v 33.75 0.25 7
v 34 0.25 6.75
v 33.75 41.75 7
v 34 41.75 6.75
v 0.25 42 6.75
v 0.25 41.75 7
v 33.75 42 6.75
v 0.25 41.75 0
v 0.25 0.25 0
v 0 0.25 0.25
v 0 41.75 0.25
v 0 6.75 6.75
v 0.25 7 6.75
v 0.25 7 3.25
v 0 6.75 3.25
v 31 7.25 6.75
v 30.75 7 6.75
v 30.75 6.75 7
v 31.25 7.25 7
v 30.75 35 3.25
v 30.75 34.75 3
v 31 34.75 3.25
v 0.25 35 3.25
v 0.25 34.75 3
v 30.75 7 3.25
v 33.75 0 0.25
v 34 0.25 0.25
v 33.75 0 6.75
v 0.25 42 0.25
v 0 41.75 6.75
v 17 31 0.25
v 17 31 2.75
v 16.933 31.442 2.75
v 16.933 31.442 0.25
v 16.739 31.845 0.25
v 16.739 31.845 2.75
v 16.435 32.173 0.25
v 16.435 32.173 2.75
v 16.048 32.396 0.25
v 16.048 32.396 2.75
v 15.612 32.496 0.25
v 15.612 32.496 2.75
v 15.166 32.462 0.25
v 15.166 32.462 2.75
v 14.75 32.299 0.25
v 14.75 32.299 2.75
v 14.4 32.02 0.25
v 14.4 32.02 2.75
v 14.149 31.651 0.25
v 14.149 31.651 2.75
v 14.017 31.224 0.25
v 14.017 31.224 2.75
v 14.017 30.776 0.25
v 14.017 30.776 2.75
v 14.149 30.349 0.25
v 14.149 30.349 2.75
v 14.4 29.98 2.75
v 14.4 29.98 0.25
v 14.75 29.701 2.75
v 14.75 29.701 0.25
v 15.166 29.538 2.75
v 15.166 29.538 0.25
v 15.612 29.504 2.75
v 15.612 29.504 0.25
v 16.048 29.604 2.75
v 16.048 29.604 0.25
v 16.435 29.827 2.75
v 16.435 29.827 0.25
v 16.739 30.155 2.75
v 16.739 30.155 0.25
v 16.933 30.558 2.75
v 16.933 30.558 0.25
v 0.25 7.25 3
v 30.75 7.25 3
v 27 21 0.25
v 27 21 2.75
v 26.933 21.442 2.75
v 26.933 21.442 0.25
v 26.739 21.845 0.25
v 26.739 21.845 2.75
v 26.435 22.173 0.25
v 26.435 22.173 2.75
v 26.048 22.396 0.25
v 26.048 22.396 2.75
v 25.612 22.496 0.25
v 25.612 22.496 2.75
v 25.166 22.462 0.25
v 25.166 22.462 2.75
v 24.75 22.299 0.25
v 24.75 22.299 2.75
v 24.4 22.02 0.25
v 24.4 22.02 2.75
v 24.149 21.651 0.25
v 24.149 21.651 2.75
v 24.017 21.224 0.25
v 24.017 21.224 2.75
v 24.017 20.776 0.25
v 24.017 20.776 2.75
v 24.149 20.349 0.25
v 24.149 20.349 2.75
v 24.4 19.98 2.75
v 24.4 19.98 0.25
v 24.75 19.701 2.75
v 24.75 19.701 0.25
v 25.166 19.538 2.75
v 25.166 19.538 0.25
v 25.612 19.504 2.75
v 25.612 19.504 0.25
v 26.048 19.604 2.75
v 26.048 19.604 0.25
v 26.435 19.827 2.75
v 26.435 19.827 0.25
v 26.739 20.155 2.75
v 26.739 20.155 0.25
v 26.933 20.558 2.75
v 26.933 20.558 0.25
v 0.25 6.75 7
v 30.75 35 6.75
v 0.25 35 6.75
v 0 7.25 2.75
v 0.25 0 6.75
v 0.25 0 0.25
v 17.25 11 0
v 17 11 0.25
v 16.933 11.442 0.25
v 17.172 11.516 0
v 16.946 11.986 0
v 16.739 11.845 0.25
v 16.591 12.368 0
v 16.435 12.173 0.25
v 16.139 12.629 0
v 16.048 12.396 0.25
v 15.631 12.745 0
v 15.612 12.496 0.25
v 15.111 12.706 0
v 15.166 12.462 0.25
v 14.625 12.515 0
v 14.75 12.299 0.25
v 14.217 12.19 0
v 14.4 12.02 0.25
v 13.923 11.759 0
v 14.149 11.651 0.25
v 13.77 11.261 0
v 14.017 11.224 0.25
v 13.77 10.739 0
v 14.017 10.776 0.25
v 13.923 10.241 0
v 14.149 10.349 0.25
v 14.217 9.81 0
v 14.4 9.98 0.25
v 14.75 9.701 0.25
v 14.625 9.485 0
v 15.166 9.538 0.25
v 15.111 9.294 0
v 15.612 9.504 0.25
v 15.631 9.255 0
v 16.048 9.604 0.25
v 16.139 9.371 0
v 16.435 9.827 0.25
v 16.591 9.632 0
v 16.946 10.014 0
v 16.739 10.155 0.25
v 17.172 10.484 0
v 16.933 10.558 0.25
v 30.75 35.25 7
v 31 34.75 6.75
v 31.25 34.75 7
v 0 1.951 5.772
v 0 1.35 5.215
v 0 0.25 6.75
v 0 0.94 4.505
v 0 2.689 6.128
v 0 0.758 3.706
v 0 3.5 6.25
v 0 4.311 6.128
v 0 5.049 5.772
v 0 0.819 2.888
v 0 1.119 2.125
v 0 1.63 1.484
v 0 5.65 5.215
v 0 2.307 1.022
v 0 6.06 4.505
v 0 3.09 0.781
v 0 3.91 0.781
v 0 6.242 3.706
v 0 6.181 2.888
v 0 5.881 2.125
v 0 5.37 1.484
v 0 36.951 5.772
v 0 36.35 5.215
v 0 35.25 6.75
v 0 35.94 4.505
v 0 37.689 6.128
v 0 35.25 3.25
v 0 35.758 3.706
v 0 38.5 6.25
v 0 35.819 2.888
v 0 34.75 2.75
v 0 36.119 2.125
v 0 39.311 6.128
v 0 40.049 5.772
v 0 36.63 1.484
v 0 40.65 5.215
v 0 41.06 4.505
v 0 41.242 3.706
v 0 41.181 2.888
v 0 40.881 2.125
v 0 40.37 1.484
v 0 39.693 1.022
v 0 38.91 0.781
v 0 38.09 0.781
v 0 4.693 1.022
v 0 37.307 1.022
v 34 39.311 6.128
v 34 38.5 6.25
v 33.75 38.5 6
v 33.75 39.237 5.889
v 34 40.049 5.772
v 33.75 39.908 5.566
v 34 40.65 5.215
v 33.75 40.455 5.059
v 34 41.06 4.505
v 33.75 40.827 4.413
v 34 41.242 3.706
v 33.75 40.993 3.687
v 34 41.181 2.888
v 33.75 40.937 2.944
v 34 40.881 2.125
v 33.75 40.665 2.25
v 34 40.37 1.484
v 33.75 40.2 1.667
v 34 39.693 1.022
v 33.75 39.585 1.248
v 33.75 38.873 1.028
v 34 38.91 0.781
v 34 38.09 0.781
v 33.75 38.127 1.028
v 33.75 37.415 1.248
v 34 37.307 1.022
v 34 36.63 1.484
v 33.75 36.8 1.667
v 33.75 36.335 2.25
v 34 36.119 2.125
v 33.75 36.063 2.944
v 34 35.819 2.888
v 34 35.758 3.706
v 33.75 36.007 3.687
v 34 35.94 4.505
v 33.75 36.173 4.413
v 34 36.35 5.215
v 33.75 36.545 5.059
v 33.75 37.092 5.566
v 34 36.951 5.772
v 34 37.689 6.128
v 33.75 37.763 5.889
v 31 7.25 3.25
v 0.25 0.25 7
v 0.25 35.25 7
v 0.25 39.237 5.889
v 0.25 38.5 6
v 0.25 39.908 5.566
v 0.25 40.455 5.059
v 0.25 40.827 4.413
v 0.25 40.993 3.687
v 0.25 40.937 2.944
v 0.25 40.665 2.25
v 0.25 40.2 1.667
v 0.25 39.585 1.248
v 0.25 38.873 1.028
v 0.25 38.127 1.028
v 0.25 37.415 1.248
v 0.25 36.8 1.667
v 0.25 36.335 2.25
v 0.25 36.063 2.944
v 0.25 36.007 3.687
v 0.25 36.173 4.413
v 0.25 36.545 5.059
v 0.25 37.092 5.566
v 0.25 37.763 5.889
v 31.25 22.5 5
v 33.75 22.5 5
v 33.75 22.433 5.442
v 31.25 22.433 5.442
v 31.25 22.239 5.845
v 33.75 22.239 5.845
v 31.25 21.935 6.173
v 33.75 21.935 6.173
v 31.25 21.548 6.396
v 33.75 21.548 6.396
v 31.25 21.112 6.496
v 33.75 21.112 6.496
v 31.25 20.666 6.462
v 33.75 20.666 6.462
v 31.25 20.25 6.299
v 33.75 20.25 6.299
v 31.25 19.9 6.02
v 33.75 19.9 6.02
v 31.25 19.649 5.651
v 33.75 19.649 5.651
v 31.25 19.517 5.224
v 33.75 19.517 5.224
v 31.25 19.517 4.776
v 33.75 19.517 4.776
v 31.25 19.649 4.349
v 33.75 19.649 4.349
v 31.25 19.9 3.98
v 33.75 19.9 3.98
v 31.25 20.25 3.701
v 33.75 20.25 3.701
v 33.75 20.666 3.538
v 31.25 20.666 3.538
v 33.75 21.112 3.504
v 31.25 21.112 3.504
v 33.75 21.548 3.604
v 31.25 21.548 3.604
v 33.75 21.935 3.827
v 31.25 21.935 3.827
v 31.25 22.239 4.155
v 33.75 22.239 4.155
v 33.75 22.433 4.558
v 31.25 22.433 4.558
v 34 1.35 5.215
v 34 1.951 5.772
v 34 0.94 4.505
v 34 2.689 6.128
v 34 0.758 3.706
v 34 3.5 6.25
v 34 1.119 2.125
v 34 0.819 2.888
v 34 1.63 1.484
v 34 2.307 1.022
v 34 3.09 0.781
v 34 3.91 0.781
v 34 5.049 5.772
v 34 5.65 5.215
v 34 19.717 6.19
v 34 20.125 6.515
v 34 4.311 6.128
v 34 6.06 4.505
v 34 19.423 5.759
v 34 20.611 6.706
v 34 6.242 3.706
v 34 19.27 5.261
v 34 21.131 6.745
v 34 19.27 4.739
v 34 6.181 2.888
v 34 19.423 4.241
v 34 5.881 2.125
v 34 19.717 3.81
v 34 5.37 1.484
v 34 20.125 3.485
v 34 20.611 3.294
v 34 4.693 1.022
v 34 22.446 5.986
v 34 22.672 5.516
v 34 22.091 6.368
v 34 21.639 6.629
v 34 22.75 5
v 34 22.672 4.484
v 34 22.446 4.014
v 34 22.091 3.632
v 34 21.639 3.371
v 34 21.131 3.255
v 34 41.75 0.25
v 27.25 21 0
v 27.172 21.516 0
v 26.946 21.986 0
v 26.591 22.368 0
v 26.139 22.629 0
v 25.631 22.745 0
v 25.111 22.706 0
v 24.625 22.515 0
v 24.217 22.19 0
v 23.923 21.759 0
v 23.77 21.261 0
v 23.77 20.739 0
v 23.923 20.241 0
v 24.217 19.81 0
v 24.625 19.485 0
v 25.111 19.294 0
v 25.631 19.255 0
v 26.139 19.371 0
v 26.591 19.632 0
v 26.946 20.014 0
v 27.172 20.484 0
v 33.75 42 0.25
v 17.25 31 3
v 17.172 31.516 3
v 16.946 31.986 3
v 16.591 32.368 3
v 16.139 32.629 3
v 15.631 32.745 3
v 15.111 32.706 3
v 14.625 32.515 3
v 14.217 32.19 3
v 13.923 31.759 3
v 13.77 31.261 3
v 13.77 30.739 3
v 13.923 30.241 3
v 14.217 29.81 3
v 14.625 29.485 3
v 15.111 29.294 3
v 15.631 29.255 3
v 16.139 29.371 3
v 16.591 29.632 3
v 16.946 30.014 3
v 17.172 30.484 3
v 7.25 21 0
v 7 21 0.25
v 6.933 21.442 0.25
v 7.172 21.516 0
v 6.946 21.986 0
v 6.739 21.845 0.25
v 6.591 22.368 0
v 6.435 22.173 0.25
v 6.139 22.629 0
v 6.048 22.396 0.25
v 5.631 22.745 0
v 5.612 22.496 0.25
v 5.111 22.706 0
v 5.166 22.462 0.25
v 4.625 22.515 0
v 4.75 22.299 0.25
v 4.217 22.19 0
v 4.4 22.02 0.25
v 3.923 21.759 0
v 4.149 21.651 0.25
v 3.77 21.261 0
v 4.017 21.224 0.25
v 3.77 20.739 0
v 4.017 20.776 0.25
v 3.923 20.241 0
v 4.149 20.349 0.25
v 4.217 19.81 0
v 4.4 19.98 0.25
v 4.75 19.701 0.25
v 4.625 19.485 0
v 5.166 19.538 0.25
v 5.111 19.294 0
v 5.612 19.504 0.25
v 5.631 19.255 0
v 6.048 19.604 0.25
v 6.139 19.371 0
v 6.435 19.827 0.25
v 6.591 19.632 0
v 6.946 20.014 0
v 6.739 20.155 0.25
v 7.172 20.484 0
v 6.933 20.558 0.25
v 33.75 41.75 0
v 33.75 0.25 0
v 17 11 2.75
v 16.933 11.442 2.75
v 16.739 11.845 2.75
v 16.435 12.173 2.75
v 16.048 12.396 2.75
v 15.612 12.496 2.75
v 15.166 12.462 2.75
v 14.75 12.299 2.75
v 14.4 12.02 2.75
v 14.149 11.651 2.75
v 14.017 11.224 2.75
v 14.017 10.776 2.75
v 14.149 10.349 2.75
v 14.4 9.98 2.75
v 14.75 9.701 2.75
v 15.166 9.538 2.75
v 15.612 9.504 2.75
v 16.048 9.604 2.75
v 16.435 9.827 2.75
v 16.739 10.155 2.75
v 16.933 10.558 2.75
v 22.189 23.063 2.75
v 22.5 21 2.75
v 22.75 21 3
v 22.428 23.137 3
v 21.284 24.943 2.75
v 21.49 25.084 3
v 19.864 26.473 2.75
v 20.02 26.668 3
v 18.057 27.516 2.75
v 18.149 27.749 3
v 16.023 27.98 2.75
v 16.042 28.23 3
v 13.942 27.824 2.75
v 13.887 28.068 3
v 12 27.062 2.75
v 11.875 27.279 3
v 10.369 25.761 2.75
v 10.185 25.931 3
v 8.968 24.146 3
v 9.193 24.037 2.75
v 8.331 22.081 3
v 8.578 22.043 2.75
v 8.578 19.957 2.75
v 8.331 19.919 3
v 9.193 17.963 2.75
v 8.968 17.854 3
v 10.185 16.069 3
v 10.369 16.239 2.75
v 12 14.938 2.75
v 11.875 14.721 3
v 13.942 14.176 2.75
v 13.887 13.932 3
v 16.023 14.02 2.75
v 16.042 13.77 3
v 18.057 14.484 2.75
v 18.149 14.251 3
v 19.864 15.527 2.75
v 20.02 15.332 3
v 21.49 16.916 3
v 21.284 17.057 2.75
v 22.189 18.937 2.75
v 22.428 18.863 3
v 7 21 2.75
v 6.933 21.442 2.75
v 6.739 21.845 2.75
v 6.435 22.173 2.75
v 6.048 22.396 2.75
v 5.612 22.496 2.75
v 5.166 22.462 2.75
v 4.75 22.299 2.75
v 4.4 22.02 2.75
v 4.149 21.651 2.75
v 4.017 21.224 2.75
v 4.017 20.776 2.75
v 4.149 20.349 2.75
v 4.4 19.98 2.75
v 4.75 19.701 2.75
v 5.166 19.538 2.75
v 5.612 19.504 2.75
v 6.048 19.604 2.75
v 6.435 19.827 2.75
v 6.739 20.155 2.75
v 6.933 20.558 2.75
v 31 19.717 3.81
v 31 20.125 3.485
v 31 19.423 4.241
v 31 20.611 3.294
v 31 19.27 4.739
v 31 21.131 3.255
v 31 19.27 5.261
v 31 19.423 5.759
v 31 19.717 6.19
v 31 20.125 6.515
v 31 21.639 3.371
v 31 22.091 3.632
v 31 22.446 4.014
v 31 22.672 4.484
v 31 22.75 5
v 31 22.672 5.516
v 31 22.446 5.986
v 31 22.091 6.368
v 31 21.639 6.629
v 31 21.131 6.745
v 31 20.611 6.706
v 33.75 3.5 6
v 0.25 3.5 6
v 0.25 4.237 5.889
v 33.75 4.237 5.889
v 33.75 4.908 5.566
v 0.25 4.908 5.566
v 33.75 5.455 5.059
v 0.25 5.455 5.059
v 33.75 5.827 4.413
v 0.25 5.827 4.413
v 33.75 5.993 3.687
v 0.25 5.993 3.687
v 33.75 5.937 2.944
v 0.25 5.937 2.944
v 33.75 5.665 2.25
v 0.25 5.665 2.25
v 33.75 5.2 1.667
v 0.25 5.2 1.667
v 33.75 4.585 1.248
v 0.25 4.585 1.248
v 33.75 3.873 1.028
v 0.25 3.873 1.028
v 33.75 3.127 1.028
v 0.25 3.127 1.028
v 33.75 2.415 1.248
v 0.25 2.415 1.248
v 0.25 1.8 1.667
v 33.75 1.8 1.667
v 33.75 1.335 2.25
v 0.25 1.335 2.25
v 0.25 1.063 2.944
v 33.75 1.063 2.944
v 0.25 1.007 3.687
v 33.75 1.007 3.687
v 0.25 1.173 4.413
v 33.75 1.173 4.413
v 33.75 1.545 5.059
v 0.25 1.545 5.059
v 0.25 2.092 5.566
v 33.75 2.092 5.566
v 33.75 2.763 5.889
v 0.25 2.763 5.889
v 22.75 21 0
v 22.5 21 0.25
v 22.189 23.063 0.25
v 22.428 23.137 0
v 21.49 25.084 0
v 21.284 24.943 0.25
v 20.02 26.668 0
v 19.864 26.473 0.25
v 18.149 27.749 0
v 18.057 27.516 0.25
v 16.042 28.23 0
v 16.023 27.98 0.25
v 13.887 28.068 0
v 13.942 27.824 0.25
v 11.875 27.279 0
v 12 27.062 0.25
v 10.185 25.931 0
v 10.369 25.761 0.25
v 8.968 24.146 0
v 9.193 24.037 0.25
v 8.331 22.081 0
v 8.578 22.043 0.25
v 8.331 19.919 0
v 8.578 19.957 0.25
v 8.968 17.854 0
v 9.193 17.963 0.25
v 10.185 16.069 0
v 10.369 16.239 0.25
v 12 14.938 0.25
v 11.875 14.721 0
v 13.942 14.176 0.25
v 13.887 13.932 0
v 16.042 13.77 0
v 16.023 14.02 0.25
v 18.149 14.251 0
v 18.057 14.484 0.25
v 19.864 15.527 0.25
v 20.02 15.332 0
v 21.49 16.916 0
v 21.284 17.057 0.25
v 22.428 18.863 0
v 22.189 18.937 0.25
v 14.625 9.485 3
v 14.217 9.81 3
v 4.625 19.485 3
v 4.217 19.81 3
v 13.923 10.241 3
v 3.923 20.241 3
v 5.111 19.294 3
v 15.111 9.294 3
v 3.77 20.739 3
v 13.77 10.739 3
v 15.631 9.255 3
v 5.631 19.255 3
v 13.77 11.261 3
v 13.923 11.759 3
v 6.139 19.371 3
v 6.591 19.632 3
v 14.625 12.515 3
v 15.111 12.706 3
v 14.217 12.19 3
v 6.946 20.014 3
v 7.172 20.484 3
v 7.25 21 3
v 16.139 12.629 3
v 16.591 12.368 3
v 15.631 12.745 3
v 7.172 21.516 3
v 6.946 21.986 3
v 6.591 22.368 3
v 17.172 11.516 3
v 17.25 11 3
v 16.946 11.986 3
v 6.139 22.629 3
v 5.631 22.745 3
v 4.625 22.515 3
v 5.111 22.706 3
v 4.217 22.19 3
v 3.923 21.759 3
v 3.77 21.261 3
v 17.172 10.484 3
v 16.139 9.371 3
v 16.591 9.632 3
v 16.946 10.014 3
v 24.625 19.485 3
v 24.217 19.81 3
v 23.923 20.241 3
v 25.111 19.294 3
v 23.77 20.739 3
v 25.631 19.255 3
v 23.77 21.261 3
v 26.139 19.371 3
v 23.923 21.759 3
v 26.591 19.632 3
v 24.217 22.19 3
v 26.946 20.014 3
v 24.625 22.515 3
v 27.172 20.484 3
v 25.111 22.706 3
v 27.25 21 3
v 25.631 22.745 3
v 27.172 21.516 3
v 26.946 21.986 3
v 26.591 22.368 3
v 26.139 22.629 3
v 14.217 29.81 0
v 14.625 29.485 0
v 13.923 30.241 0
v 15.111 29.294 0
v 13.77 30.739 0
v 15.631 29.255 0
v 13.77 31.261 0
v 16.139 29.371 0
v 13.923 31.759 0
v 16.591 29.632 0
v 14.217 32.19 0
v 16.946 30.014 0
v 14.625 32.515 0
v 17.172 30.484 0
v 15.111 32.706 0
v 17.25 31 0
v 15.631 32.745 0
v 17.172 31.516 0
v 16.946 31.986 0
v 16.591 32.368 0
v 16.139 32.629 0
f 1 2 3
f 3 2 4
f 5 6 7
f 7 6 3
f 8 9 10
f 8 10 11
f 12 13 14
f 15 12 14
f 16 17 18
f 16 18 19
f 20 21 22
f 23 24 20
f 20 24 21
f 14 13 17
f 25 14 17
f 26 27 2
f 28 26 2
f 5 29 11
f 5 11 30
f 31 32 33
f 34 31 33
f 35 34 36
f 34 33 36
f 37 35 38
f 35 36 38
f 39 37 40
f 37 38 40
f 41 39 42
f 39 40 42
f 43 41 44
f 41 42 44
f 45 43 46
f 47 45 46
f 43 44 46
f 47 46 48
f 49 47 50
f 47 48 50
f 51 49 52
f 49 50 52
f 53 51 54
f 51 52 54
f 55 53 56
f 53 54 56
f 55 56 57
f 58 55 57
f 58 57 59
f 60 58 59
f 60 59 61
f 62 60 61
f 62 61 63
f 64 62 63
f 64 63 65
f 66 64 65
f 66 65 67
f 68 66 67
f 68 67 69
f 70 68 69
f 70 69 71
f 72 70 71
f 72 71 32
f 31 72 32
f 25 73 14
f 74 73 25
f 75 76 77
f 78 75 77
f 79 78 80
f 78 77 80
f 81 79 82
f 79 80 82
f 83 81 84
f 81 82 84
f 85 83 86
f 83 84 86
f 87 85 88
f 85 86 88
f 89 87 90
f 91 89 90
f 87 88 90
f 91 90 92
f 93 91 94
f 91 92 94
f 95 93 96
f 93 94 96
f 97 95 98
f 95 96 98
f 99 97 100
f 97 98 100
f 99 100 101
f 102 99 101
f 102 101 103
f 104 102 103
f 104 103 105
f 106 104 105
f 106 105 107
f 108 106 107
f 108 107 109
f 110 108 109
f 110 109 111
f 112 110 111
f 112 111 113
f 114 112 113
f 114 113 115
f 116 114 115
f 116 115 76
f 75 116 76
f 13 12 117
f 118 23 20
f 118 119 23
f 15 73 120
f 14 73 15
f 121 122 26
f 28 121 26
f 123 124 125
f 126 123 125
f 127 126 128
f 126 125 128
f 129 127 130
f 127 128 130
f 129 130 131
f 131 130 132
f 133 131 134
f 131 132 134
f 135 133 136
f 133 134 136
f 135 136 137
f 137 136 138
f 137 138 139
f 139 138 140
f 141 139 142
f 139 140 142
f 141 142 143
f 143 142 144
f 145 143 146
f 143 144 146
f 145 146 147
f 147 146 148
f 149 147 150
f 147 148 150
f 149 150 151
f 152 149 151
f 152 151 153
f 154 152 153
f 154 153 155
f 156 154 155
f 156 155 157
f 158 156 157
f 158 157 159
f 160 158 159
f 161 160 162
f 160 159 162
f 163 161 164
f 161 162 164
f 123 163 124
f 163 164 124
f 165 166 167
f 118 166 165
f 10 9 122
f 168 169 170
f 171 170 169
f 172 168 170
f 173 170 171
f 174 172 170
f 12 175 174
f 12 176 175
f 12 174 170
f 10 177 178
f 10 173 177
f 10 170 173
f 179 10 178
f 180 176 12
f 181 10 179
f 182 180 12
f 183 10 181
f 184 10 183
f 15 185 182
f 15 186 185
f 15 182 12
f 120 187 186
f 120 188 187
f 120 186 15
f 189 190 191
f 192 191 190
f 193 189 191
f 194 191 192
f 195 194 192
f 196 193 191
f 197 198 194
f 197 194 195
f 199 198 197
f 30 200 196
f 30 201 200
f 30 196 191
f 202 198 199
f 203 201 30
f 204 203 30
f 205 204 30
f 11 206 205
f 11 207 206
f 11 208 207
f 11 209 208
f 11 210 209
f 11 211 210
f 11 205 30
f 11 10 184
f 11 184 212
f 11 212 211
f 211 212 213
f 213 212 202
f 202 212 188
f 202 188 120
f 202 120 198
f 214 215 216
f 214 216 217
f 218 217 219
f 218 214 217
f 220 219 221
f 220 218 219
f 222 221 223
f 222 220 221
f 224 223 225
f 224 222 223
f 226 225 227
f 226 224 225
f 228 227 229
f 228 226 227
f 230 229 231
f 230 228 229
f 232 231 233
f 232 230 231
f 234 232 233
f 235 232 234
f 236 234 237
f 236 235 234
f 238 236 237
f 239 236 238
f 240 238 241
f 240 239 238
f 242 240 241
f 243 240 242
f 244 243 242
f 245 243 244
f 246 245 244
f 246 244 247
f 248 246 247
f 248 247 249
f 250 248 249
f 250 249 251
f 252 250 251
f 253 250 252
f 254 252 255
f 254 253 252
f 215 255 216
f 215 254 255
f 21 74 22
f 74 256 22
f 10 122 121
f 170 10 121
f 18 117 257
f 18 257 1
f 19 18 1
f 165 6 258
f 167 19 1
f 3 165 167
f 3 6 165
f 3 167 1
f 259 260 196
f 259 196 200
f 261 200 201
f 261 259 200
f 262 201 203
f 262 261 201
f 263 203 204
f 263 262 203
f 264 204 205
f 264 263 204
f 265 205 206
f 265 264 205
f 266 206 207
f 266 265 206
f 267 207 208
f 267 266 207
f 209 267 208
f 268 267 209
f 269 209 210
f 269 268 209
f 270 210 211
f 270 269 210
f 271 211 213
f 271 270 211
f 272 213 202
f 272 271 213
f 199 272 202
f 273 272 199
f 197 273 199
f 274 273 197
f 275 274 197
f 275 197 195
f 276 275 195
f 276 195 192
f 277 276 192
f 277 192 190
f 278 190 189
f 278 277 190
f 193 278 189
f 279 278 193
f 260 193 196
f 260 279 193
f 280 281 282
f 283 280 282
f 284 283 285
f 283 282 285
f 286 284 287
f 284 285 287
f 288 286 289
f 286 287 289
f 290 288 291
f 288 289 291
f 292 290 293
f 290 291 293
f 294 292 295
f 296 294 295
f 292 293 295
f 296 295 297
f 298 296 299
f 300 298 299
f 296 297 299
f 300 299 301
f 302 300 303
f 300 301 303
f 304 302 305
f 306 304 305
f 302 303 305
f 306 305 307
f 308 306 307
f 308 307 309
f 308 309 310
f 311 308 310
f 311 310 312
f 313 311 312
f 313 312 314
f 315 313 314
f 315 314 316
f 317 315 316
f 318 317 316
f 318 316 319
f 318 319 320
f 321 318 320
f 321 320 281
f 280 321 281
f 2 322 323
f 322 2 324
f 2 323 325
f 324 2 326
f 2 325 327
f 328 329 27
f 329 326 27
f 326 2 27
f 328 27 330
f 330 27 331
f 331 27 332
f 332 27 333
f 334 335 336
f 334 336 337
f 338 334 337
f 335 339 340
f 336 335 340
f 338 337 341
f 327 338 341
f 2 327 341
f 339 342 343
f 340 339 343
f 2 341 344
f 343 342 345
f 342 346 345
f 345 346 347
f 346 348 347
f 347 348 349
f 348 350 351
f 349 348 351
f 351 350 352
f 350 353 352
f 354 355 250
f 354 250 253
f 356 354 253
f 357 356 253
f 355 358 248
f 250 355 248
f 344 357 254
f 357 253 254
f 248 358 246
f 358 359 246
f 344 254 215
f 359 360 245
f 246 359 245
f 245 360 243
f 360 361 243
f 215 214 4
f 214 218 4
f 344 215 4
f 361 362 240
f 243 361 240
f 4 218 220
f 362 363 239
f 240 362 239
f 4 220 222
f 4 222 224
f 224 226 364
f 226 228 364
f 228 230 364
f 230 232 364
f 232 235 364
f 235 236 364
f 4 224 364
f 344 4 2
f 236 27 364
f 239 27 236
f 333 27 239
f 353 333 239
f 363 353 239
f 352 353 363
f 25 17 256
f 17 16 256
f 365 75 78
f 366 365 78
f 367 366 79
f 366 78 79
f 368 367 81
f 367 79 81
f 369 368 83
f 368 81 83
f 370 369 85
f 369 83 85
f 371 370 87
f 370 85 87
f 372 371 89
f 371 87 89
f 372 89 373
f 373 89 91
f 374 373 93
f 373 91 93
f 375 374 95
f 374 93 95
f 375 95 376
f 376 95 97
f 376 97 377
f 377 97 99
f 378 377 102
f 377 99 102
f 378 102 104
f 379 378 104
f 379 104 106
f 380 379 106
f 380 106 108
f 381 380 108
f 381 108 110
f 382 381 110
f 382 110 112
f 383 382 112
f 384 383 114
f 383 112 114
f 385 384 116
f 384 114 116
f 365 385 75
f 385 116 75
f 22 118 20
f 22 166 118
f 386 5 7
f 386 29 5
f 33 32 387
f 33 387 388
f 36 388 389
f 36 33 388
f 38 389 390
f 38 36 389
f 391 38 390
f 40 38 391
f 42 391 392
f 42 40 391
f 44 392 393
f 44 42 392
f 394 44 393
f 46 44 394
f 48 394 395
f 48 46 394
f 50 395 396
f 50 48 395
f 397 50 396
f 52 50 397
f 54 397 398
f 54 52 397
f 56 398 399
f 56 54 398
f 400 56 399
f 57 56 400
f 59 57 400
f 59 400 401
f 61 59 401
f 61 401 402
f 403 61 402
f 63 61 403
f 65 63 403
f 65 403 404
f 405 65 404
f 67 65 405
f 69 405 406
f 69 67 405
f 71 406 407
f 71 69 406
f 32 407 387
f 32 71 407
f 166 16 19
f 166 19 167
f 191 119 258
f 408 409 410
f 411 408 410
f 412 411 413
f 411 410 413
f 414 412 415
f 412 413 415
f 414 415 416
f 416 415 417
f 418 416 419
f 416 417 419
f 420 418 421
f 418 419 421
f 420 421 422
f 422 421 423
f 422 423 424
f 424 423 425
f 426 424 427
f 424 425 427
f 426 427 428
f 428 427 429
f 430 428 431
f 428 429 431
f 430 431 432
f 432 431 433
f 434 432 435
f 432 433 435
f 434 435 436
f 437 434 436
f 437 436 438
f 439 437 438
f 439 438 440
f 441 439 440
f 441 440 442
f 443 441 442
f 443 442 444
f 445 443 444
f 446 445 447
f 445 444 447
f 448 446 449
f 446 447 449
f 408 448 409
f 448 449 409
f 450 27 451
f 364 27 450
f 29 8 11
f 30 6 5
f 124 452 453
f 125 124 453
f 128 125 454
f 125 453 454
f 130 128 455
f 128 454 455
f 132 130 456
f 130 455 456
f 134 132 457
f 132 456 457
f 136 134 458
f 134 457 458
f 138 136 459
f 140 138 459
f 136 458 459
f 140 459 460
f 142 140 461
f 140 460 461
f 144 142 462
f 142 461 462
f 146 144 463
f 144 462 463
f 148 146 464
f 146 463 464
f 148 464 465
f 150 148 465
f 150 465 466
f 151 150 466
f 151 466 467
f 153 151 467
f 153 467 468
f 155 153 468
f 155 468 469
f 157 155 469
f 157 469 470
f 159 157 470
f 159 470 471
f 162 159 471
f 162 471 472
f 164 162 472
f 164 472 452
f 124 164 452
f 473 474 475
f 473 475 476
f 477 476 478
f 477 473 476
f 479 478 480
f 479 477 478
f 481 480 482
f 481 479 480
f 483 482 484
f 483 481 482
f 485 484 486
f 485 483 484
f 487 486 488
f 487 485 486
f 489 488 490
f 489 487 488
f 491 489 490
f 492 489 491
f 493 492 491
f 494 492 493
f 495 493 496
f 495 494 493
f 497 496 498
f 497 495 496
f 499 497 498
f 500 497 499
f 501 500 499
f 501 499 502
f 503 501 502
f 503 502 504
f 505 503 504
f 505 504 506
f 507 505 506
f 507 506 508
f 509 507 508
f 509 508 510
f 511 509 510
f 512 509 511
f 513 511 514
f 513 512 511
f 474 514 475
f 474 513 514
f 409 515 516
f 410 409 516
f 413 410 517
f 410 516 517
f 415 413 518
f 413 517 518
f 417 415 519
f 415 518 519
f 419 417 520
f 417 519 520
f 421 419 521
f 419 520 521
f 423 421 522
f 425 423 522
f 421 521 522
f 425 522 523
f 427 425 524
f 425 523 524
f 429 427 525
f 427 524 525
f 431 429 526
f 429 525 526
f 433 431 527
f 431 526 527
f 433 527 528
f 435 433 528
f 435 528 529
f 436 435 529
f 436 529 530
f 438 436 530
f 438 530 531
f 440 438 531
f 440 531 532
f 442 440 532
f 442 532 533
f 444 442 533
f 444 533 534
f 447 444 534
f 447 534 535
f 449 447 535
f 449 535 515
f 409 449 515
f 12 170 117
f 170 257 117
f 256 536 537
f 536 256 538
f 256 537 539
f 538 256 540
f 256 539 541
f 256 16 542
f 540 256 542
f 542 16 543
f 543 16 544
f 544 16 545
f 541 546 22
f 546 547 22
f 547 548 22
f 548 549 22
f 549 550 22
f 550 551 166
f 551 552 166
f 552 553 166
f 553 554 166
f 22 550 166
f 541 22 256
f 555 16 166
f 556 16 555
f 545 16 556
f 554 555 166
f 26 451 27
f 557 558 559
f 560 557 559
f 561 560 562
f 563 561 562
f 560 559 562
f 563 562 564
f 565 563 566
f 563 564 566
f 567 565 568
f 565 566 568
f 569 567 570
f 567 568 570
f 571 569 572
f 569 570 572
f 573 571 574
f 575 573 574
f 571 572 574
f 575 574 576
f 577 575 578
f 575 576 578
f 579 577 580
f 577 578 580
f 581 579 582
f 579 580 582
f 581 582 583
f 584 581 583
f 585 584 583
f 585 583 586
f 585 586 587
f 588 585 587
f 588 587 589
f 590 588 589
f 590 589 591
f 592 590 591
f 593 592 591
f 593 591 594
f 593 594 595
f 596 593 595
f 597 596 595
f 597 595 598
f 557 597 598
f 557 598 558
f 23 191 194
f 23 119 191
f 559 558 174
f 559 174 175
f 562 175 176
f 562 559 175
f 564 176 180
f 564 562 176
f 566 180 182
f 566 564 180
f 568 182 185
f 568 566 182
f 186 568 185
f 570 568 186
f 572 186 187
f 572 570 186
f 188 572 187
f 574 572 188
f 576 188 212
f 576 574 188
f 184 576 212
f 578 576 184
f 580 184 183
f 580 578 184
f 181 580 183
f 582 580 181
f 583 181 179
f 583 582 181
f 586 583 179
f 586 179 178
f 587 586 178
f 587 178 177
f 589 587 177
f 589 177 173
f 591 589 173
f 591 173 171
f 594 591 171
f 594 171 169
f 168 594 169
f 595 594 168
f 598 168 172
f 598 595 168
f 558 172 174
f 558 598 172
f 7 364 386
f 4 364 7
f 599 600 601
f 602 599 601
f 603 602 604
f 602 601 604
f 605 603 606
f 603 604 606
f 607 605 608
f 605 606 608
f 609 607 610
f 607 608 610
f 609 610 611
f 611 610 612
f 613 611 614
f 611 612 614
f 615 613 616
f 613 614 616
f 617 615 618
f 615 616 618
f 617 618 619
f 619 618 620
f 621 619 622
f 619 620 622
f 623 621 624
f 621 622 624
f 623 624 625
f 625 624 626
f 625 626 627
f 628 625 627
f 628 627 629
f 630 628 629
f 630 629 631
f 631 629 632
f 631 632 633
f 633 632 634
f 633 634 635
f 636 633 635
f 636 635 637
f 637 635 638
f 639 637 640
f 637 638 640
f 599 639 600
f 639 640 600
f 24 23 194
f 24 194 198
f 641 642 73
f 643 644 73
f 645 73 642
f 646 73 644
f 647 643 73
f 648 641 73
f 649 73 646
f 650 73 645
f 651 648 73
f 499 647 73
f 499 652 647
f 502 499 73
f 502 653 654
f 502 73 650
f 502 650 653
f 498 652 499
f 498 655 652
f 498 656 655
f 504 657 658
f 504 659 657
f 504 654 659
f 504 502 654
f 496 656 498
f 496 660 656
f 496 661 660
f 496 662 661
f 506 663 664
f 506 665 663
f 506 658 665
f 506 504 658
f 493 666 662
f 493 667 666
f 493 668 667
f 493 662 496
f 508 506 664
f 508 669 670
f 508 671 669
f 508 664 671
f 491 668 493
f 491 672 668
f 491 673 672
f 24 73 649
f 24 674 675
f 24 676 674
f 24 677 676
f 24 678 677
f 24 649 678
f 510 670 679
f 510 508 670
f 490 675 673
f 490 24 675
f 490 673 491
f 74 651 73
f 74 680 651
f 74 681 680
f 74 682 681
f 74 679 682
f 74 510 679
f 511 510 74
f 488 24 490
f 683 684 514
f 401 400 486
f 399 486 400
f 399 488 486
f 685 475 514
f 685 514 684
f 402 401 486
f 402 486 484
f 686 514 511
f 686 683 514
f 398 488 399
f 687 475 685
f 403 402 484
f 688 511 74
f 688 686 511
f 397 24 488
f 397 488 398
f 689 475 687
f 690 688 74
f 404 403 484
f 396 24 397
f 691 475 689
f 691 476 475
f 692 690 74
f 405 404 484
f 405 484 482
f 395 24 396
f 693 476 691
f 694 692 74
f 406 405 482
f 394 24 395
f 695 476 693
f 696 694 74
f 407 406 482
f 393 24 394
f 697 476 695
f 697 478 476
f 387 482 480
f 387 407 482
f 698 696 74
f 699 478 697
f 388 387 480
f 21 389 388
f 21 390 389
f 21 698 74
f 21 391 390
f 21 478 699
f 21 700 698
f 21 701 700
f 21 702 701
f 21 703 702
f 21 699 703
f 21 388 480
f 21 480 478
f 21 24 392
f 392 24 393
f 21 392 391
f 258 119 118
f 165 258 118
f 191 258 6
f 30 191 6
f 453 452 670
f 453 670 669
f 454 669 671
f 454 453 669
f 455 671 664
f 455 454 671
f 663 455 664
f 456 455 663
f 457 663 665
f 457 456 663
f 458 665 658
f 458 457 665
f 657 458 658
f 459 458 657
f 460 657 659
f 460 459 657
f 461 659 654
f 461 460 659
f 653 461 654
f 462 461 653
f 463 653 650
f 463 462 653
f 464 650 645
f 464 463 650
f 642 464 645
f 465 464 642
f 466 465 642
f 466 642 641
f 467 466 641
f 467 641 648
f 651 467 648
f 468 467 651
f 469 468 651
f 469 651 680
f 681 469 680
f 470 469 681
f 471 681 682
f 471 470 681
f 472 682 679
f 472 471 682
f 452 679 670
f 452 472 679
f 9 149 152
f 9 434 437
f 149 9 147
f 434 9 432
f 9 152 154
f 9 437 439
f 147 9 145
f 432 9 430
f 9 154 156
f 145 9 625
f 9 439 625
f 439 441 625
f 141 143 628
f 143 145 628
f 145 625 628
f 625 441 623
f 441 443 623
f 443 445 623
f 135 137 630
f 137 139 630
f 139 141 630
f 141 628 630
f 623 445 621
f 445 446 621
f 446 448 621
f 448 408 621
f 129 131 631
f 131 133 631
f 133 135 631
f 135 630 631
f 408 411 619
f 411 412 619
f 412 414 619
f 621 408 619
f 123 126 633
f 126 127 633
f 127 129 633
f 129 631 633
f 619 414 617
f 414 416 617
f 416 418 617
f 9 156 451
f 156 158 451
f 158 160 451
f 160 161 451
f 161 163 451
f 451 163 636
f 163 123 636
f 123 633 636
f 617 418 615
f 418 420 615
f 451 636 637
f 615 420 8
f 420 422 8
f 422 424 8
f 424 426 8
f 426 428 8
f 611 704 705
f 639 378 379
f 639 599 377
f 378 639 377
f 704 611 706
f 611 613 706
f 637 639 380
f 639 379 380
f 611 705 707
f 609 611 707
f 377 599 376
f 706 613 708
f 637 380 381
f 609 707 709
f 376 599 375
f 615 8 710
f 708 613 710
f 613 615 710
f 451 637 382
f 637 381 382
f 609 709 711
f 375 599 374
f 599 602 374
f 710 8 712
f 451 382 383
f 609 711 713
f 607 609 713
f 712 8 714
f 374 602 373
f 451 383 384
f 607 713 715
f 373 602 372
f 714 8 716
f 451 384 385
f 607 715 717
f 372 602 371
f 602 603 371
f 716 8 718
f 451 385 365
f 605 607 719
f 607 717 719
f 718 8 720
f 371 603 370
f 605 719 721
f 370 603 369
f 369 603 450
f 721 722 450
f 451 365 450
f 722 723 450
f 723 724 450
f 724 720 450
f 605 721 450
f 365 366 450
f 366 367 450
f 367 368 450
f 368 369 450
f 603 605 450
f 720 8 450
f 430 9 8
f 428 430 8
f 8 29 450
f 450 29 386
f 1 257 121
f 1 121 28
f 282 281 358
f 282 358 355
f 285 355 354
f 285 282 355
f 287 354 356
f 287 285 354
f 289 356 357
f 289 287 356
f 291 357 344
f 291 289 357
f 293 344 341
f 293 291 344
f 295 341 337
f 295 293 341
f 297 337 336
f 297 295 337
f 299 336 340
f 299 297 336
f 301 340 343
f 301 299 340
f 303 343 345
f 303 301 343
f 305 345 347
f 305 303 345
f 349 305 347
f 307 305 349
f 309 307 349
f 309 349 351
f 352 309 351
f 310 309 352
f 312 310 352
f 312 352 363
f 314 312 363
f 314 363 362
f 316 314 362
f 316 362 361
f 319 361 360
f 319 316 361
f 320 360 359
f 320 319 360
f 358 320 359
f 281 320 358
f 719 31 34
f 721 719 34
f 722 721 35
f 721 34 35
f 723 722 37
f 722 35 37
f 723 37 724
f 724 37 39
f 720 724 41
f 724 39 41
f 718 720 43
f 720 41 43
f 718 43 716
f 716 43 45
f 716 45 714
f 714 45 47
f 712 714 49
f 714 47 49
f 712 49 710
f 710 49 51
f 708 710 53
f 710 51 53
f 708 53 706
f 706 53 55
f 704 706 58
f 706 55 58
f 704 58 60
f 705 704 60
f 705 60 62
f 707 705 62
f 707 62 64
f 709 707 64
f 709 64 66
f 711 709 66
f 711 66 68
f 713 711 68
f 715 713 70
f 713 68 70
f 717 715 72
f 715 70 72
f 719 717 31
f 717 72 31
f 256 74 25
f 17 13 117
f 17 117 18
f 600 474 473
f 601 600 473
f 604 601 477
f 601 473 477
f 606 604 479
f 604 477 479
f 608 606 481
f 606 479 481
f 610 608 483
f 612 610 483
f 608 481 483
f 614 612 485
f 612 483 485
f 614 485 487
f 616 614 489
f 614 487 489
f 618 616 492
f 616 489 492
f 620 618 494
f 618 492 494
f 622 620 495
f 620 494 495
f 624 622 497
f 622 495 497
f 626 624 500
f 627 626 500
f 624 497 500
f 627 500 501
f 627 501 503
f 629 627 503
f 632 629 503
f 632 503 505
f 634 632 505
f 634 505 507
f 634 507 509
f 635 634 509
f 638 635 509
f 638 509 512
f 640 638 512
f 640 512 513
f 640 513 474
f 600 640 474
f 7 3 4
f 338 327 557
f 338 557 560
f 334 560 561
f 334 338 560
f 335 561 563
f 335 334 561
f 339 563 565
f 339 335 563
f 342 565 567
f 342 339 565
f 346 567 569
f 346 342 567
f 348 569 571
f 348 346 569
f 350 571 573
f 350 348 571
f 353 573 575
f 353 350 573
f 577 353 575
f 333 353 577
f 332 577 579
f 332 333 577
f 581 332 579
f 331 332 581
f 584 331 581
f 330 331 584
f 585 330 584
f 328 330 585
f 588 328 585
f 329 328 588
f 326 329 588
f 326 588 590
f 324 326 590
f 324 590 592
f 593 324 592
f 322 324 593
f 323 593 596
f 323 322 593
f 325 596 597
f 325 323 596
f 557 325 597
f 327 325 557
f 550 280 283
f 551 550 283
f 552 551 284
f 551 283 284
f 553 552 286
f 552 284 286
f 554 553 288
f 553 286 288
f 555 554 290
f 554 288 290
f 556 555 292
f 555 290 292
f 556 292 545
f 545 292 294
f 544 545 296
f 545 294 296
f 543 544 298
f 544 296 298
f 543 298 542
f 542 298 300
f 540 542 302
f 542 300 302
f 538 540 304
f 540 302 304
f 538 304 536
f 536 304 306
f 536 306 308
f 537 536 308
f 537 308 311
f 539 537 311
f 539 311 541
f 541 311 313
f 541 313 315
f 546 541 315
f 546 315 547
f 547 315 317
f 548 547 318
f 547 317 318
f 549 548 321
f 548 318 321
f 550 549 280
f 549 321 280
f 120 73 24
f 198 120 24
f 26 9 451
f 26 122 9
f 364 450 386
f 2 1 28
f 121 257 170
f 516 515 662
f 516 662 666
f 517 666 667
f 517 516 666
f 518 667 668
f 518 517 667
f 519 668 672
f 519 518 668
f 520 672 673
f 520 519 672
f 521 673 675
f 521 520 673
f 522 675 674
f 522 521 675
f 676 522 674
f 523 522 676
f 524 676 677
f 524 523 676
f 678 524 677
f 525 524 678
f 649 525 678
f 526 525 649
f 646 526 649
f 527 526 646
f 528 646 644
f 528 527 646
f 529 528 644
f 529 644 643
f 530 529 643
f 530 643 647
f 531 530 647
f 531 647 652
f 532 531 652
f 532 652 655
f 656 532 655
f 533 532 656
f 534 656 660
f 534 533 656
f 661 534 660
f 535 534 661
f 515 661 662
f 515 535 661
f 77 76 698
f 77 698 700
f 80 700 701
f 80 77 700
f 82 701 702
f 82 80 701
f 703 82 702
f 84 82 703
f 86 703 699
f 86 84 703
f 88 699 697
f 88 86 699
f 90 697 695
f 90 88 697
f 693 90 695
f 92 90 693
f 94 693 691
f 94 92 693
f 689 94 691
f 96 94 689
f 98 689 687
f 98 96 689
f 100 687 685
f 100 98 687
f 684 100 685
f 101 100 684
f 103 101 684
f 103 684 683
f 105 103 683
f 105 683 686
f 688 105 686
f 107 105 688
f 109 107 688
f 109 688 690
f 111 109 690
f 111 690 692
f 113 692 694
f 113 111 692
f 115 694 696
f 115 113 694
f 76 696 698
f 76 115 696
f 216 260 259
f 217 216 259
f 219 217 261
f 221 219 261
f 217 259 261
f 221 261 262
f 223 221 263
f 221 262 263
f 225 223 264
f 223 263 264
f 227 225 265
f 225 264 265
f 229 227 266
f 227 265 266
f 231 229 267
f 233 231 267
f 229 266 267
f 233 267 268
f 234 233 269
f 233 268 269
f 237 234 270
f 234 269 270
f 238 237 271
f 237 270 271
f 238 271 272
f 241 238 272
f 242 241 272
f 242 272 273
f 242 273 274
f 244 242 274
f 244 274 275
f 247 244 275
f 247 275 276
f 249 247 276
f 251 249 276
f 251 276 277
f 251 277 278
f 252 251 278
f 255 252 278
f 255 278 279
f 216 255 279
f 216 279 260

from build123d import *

# Parameters (mm, degrees)
ESQUISSE1_W             = 34
ESQUISSE1_H             = 42
BOSS_EXTRU_1_DEPTH      = 7
ESQUISSE2_W             = 31
ESQUISSE2_H             = 28
ENL_V_MAT_EXTRU_1_DEPTH = 4
ESQUISSE3_R             = 2.5
ENL_V_MAT_EXTRU_2_DEPTH = 55.488530903
ESQUISSE4_R             = 7
ESQUISSE4_R_2           = 1.5
ENL_V_MAT_EXTRU_3_DEPTH = 4
ESQUISSE5_R             = 1.5
ENL_V_MAT_EXTRU_4_DEPTH = 4
CHANFREIN2_SIZE         = 0.25


with BuildPart() as part:
    # Esquisse1 → Boss.-Extru.1 (new body)
    with BuildSketch(Plane.XY):
        with Locations((17, 21)):
            Rectangle(ESQUISSE1_W, ESQUISSE1_H)
    extrude(amount=BOSS_EXTRU_1_DEPTH)

    # Esquisse2 → Enlèv. mat.-Extru.1 (cut)
    with BuildSketch(Plane.XY.offset(7)):
        with Locations((15.5, 21)):
            Rectangle(ESQUISSE2_W, ESQUISSE2_H)
    extrude(amount=-ENL_V_MAT_EXTRU_1_DEPTH, mode=Mode.SUBTRACT)

    # Esquisse3 → Enlèv. mat.-Extru.2 (cut, through all)
    with BuildSketch(Plane.ZY):
        with Locations((3.5, 38.5)):
            Circle(ESQUISSE3_R)
        with Locations((3.5, 3.5)):
            Circle(ESQUISSE3_R)
    extrude(amount=-ENL_V_MAT_EXTRU_2_DEPTH, mode=Mode.SUBTRACT)

    # Esquisse4 → Enlèv. mat.-Extru.3 (cut)
    with BuildSketch(Plane.XY.offset(3)):
        with Locations((15.5, 21)):
            Circle(ESQUISSE4_R)
        with Locations((15.5, 31)):
            Circle(ESQUISSE4_R_2)
        with Locations((15.5, 11)):
            Circle(ESQUISSE4_R_2)
        with Locations((25.5, 21)):
            Circle(ESQUISSE4_R_2)
        with Locations((5.5, 21)):
            Circle(ESQUISSE4_R_2)
    extrude(amount=-ENL_V_MAT_EXTRU_3_DEPTH, mode=Mode.SUBTRACT)

    # Esquisse5 → Enlèv. mat.-Extru.4 (cut)
    with BuildSketch(Plane(origin=(34, 0, 0), x_dir=(0, 0, -1), z_dir=(1, 0, 0))):
        with Locations(Location((-5, 21, 0), (0, 0, 90))):
            Circle(ESQUISSE5_R)
    extrude(amount=-ENL_V_MAT_EXTRU_4_DEPTH, mode=Mode.SUBTRACT)

    # Chanfrein2
    chanfrein2_edges = [part.edges().sort_by_distance(p)[0] for p in [
        (34, 21, 7),
        (17, 42, 7),
        (0, 3.5, 7),
        (0, 21, 3),
        (0, 7, 5),
        (15.5, 35, 3),
        (0, 35, 5),
        (31, 21, 3),
        (31, 35, 5),
        (15.5, 7, 3),
        (31, 7, 5),
        (15.5, 7, 7),
        (31, 21, 7),
        (15.5, 35, 7),
        (34, 38.5, 1),
        (0, 38.5, 1),
        (34, 3.5, 1),
        (0, 3.5, 1),
        (0, 38.5, 7),
        (14, 31, 0),
        (14, 31, 3),
        (17, 42, 0),
        (14, 11, 0),
        (14, 11, 3),
        (24, 21, 0),
        (24, 21, 3),
        (34, 21, 0),
        (4, 21, 0),
        (4, 21, 3),
        (8.5, 21, 0),
        (8.5, 21, 3),
        (17, 0, 0),
        (0, 21, 0),
        (31, 19.5, 5),
        (34, 19.5, 5),
        (17, 0, 7),
        (0, 42, 3.5),
        (34, 42, 3.5),
        (34, 0, 3.5),
        (0, 0, 3.5),
    ]]
    chamfer(chanfrein2_edges, length=CHANFREIN2_SIZE - 0.0001)  # a hair under: the kernel refuses the full size


solid = part.part
